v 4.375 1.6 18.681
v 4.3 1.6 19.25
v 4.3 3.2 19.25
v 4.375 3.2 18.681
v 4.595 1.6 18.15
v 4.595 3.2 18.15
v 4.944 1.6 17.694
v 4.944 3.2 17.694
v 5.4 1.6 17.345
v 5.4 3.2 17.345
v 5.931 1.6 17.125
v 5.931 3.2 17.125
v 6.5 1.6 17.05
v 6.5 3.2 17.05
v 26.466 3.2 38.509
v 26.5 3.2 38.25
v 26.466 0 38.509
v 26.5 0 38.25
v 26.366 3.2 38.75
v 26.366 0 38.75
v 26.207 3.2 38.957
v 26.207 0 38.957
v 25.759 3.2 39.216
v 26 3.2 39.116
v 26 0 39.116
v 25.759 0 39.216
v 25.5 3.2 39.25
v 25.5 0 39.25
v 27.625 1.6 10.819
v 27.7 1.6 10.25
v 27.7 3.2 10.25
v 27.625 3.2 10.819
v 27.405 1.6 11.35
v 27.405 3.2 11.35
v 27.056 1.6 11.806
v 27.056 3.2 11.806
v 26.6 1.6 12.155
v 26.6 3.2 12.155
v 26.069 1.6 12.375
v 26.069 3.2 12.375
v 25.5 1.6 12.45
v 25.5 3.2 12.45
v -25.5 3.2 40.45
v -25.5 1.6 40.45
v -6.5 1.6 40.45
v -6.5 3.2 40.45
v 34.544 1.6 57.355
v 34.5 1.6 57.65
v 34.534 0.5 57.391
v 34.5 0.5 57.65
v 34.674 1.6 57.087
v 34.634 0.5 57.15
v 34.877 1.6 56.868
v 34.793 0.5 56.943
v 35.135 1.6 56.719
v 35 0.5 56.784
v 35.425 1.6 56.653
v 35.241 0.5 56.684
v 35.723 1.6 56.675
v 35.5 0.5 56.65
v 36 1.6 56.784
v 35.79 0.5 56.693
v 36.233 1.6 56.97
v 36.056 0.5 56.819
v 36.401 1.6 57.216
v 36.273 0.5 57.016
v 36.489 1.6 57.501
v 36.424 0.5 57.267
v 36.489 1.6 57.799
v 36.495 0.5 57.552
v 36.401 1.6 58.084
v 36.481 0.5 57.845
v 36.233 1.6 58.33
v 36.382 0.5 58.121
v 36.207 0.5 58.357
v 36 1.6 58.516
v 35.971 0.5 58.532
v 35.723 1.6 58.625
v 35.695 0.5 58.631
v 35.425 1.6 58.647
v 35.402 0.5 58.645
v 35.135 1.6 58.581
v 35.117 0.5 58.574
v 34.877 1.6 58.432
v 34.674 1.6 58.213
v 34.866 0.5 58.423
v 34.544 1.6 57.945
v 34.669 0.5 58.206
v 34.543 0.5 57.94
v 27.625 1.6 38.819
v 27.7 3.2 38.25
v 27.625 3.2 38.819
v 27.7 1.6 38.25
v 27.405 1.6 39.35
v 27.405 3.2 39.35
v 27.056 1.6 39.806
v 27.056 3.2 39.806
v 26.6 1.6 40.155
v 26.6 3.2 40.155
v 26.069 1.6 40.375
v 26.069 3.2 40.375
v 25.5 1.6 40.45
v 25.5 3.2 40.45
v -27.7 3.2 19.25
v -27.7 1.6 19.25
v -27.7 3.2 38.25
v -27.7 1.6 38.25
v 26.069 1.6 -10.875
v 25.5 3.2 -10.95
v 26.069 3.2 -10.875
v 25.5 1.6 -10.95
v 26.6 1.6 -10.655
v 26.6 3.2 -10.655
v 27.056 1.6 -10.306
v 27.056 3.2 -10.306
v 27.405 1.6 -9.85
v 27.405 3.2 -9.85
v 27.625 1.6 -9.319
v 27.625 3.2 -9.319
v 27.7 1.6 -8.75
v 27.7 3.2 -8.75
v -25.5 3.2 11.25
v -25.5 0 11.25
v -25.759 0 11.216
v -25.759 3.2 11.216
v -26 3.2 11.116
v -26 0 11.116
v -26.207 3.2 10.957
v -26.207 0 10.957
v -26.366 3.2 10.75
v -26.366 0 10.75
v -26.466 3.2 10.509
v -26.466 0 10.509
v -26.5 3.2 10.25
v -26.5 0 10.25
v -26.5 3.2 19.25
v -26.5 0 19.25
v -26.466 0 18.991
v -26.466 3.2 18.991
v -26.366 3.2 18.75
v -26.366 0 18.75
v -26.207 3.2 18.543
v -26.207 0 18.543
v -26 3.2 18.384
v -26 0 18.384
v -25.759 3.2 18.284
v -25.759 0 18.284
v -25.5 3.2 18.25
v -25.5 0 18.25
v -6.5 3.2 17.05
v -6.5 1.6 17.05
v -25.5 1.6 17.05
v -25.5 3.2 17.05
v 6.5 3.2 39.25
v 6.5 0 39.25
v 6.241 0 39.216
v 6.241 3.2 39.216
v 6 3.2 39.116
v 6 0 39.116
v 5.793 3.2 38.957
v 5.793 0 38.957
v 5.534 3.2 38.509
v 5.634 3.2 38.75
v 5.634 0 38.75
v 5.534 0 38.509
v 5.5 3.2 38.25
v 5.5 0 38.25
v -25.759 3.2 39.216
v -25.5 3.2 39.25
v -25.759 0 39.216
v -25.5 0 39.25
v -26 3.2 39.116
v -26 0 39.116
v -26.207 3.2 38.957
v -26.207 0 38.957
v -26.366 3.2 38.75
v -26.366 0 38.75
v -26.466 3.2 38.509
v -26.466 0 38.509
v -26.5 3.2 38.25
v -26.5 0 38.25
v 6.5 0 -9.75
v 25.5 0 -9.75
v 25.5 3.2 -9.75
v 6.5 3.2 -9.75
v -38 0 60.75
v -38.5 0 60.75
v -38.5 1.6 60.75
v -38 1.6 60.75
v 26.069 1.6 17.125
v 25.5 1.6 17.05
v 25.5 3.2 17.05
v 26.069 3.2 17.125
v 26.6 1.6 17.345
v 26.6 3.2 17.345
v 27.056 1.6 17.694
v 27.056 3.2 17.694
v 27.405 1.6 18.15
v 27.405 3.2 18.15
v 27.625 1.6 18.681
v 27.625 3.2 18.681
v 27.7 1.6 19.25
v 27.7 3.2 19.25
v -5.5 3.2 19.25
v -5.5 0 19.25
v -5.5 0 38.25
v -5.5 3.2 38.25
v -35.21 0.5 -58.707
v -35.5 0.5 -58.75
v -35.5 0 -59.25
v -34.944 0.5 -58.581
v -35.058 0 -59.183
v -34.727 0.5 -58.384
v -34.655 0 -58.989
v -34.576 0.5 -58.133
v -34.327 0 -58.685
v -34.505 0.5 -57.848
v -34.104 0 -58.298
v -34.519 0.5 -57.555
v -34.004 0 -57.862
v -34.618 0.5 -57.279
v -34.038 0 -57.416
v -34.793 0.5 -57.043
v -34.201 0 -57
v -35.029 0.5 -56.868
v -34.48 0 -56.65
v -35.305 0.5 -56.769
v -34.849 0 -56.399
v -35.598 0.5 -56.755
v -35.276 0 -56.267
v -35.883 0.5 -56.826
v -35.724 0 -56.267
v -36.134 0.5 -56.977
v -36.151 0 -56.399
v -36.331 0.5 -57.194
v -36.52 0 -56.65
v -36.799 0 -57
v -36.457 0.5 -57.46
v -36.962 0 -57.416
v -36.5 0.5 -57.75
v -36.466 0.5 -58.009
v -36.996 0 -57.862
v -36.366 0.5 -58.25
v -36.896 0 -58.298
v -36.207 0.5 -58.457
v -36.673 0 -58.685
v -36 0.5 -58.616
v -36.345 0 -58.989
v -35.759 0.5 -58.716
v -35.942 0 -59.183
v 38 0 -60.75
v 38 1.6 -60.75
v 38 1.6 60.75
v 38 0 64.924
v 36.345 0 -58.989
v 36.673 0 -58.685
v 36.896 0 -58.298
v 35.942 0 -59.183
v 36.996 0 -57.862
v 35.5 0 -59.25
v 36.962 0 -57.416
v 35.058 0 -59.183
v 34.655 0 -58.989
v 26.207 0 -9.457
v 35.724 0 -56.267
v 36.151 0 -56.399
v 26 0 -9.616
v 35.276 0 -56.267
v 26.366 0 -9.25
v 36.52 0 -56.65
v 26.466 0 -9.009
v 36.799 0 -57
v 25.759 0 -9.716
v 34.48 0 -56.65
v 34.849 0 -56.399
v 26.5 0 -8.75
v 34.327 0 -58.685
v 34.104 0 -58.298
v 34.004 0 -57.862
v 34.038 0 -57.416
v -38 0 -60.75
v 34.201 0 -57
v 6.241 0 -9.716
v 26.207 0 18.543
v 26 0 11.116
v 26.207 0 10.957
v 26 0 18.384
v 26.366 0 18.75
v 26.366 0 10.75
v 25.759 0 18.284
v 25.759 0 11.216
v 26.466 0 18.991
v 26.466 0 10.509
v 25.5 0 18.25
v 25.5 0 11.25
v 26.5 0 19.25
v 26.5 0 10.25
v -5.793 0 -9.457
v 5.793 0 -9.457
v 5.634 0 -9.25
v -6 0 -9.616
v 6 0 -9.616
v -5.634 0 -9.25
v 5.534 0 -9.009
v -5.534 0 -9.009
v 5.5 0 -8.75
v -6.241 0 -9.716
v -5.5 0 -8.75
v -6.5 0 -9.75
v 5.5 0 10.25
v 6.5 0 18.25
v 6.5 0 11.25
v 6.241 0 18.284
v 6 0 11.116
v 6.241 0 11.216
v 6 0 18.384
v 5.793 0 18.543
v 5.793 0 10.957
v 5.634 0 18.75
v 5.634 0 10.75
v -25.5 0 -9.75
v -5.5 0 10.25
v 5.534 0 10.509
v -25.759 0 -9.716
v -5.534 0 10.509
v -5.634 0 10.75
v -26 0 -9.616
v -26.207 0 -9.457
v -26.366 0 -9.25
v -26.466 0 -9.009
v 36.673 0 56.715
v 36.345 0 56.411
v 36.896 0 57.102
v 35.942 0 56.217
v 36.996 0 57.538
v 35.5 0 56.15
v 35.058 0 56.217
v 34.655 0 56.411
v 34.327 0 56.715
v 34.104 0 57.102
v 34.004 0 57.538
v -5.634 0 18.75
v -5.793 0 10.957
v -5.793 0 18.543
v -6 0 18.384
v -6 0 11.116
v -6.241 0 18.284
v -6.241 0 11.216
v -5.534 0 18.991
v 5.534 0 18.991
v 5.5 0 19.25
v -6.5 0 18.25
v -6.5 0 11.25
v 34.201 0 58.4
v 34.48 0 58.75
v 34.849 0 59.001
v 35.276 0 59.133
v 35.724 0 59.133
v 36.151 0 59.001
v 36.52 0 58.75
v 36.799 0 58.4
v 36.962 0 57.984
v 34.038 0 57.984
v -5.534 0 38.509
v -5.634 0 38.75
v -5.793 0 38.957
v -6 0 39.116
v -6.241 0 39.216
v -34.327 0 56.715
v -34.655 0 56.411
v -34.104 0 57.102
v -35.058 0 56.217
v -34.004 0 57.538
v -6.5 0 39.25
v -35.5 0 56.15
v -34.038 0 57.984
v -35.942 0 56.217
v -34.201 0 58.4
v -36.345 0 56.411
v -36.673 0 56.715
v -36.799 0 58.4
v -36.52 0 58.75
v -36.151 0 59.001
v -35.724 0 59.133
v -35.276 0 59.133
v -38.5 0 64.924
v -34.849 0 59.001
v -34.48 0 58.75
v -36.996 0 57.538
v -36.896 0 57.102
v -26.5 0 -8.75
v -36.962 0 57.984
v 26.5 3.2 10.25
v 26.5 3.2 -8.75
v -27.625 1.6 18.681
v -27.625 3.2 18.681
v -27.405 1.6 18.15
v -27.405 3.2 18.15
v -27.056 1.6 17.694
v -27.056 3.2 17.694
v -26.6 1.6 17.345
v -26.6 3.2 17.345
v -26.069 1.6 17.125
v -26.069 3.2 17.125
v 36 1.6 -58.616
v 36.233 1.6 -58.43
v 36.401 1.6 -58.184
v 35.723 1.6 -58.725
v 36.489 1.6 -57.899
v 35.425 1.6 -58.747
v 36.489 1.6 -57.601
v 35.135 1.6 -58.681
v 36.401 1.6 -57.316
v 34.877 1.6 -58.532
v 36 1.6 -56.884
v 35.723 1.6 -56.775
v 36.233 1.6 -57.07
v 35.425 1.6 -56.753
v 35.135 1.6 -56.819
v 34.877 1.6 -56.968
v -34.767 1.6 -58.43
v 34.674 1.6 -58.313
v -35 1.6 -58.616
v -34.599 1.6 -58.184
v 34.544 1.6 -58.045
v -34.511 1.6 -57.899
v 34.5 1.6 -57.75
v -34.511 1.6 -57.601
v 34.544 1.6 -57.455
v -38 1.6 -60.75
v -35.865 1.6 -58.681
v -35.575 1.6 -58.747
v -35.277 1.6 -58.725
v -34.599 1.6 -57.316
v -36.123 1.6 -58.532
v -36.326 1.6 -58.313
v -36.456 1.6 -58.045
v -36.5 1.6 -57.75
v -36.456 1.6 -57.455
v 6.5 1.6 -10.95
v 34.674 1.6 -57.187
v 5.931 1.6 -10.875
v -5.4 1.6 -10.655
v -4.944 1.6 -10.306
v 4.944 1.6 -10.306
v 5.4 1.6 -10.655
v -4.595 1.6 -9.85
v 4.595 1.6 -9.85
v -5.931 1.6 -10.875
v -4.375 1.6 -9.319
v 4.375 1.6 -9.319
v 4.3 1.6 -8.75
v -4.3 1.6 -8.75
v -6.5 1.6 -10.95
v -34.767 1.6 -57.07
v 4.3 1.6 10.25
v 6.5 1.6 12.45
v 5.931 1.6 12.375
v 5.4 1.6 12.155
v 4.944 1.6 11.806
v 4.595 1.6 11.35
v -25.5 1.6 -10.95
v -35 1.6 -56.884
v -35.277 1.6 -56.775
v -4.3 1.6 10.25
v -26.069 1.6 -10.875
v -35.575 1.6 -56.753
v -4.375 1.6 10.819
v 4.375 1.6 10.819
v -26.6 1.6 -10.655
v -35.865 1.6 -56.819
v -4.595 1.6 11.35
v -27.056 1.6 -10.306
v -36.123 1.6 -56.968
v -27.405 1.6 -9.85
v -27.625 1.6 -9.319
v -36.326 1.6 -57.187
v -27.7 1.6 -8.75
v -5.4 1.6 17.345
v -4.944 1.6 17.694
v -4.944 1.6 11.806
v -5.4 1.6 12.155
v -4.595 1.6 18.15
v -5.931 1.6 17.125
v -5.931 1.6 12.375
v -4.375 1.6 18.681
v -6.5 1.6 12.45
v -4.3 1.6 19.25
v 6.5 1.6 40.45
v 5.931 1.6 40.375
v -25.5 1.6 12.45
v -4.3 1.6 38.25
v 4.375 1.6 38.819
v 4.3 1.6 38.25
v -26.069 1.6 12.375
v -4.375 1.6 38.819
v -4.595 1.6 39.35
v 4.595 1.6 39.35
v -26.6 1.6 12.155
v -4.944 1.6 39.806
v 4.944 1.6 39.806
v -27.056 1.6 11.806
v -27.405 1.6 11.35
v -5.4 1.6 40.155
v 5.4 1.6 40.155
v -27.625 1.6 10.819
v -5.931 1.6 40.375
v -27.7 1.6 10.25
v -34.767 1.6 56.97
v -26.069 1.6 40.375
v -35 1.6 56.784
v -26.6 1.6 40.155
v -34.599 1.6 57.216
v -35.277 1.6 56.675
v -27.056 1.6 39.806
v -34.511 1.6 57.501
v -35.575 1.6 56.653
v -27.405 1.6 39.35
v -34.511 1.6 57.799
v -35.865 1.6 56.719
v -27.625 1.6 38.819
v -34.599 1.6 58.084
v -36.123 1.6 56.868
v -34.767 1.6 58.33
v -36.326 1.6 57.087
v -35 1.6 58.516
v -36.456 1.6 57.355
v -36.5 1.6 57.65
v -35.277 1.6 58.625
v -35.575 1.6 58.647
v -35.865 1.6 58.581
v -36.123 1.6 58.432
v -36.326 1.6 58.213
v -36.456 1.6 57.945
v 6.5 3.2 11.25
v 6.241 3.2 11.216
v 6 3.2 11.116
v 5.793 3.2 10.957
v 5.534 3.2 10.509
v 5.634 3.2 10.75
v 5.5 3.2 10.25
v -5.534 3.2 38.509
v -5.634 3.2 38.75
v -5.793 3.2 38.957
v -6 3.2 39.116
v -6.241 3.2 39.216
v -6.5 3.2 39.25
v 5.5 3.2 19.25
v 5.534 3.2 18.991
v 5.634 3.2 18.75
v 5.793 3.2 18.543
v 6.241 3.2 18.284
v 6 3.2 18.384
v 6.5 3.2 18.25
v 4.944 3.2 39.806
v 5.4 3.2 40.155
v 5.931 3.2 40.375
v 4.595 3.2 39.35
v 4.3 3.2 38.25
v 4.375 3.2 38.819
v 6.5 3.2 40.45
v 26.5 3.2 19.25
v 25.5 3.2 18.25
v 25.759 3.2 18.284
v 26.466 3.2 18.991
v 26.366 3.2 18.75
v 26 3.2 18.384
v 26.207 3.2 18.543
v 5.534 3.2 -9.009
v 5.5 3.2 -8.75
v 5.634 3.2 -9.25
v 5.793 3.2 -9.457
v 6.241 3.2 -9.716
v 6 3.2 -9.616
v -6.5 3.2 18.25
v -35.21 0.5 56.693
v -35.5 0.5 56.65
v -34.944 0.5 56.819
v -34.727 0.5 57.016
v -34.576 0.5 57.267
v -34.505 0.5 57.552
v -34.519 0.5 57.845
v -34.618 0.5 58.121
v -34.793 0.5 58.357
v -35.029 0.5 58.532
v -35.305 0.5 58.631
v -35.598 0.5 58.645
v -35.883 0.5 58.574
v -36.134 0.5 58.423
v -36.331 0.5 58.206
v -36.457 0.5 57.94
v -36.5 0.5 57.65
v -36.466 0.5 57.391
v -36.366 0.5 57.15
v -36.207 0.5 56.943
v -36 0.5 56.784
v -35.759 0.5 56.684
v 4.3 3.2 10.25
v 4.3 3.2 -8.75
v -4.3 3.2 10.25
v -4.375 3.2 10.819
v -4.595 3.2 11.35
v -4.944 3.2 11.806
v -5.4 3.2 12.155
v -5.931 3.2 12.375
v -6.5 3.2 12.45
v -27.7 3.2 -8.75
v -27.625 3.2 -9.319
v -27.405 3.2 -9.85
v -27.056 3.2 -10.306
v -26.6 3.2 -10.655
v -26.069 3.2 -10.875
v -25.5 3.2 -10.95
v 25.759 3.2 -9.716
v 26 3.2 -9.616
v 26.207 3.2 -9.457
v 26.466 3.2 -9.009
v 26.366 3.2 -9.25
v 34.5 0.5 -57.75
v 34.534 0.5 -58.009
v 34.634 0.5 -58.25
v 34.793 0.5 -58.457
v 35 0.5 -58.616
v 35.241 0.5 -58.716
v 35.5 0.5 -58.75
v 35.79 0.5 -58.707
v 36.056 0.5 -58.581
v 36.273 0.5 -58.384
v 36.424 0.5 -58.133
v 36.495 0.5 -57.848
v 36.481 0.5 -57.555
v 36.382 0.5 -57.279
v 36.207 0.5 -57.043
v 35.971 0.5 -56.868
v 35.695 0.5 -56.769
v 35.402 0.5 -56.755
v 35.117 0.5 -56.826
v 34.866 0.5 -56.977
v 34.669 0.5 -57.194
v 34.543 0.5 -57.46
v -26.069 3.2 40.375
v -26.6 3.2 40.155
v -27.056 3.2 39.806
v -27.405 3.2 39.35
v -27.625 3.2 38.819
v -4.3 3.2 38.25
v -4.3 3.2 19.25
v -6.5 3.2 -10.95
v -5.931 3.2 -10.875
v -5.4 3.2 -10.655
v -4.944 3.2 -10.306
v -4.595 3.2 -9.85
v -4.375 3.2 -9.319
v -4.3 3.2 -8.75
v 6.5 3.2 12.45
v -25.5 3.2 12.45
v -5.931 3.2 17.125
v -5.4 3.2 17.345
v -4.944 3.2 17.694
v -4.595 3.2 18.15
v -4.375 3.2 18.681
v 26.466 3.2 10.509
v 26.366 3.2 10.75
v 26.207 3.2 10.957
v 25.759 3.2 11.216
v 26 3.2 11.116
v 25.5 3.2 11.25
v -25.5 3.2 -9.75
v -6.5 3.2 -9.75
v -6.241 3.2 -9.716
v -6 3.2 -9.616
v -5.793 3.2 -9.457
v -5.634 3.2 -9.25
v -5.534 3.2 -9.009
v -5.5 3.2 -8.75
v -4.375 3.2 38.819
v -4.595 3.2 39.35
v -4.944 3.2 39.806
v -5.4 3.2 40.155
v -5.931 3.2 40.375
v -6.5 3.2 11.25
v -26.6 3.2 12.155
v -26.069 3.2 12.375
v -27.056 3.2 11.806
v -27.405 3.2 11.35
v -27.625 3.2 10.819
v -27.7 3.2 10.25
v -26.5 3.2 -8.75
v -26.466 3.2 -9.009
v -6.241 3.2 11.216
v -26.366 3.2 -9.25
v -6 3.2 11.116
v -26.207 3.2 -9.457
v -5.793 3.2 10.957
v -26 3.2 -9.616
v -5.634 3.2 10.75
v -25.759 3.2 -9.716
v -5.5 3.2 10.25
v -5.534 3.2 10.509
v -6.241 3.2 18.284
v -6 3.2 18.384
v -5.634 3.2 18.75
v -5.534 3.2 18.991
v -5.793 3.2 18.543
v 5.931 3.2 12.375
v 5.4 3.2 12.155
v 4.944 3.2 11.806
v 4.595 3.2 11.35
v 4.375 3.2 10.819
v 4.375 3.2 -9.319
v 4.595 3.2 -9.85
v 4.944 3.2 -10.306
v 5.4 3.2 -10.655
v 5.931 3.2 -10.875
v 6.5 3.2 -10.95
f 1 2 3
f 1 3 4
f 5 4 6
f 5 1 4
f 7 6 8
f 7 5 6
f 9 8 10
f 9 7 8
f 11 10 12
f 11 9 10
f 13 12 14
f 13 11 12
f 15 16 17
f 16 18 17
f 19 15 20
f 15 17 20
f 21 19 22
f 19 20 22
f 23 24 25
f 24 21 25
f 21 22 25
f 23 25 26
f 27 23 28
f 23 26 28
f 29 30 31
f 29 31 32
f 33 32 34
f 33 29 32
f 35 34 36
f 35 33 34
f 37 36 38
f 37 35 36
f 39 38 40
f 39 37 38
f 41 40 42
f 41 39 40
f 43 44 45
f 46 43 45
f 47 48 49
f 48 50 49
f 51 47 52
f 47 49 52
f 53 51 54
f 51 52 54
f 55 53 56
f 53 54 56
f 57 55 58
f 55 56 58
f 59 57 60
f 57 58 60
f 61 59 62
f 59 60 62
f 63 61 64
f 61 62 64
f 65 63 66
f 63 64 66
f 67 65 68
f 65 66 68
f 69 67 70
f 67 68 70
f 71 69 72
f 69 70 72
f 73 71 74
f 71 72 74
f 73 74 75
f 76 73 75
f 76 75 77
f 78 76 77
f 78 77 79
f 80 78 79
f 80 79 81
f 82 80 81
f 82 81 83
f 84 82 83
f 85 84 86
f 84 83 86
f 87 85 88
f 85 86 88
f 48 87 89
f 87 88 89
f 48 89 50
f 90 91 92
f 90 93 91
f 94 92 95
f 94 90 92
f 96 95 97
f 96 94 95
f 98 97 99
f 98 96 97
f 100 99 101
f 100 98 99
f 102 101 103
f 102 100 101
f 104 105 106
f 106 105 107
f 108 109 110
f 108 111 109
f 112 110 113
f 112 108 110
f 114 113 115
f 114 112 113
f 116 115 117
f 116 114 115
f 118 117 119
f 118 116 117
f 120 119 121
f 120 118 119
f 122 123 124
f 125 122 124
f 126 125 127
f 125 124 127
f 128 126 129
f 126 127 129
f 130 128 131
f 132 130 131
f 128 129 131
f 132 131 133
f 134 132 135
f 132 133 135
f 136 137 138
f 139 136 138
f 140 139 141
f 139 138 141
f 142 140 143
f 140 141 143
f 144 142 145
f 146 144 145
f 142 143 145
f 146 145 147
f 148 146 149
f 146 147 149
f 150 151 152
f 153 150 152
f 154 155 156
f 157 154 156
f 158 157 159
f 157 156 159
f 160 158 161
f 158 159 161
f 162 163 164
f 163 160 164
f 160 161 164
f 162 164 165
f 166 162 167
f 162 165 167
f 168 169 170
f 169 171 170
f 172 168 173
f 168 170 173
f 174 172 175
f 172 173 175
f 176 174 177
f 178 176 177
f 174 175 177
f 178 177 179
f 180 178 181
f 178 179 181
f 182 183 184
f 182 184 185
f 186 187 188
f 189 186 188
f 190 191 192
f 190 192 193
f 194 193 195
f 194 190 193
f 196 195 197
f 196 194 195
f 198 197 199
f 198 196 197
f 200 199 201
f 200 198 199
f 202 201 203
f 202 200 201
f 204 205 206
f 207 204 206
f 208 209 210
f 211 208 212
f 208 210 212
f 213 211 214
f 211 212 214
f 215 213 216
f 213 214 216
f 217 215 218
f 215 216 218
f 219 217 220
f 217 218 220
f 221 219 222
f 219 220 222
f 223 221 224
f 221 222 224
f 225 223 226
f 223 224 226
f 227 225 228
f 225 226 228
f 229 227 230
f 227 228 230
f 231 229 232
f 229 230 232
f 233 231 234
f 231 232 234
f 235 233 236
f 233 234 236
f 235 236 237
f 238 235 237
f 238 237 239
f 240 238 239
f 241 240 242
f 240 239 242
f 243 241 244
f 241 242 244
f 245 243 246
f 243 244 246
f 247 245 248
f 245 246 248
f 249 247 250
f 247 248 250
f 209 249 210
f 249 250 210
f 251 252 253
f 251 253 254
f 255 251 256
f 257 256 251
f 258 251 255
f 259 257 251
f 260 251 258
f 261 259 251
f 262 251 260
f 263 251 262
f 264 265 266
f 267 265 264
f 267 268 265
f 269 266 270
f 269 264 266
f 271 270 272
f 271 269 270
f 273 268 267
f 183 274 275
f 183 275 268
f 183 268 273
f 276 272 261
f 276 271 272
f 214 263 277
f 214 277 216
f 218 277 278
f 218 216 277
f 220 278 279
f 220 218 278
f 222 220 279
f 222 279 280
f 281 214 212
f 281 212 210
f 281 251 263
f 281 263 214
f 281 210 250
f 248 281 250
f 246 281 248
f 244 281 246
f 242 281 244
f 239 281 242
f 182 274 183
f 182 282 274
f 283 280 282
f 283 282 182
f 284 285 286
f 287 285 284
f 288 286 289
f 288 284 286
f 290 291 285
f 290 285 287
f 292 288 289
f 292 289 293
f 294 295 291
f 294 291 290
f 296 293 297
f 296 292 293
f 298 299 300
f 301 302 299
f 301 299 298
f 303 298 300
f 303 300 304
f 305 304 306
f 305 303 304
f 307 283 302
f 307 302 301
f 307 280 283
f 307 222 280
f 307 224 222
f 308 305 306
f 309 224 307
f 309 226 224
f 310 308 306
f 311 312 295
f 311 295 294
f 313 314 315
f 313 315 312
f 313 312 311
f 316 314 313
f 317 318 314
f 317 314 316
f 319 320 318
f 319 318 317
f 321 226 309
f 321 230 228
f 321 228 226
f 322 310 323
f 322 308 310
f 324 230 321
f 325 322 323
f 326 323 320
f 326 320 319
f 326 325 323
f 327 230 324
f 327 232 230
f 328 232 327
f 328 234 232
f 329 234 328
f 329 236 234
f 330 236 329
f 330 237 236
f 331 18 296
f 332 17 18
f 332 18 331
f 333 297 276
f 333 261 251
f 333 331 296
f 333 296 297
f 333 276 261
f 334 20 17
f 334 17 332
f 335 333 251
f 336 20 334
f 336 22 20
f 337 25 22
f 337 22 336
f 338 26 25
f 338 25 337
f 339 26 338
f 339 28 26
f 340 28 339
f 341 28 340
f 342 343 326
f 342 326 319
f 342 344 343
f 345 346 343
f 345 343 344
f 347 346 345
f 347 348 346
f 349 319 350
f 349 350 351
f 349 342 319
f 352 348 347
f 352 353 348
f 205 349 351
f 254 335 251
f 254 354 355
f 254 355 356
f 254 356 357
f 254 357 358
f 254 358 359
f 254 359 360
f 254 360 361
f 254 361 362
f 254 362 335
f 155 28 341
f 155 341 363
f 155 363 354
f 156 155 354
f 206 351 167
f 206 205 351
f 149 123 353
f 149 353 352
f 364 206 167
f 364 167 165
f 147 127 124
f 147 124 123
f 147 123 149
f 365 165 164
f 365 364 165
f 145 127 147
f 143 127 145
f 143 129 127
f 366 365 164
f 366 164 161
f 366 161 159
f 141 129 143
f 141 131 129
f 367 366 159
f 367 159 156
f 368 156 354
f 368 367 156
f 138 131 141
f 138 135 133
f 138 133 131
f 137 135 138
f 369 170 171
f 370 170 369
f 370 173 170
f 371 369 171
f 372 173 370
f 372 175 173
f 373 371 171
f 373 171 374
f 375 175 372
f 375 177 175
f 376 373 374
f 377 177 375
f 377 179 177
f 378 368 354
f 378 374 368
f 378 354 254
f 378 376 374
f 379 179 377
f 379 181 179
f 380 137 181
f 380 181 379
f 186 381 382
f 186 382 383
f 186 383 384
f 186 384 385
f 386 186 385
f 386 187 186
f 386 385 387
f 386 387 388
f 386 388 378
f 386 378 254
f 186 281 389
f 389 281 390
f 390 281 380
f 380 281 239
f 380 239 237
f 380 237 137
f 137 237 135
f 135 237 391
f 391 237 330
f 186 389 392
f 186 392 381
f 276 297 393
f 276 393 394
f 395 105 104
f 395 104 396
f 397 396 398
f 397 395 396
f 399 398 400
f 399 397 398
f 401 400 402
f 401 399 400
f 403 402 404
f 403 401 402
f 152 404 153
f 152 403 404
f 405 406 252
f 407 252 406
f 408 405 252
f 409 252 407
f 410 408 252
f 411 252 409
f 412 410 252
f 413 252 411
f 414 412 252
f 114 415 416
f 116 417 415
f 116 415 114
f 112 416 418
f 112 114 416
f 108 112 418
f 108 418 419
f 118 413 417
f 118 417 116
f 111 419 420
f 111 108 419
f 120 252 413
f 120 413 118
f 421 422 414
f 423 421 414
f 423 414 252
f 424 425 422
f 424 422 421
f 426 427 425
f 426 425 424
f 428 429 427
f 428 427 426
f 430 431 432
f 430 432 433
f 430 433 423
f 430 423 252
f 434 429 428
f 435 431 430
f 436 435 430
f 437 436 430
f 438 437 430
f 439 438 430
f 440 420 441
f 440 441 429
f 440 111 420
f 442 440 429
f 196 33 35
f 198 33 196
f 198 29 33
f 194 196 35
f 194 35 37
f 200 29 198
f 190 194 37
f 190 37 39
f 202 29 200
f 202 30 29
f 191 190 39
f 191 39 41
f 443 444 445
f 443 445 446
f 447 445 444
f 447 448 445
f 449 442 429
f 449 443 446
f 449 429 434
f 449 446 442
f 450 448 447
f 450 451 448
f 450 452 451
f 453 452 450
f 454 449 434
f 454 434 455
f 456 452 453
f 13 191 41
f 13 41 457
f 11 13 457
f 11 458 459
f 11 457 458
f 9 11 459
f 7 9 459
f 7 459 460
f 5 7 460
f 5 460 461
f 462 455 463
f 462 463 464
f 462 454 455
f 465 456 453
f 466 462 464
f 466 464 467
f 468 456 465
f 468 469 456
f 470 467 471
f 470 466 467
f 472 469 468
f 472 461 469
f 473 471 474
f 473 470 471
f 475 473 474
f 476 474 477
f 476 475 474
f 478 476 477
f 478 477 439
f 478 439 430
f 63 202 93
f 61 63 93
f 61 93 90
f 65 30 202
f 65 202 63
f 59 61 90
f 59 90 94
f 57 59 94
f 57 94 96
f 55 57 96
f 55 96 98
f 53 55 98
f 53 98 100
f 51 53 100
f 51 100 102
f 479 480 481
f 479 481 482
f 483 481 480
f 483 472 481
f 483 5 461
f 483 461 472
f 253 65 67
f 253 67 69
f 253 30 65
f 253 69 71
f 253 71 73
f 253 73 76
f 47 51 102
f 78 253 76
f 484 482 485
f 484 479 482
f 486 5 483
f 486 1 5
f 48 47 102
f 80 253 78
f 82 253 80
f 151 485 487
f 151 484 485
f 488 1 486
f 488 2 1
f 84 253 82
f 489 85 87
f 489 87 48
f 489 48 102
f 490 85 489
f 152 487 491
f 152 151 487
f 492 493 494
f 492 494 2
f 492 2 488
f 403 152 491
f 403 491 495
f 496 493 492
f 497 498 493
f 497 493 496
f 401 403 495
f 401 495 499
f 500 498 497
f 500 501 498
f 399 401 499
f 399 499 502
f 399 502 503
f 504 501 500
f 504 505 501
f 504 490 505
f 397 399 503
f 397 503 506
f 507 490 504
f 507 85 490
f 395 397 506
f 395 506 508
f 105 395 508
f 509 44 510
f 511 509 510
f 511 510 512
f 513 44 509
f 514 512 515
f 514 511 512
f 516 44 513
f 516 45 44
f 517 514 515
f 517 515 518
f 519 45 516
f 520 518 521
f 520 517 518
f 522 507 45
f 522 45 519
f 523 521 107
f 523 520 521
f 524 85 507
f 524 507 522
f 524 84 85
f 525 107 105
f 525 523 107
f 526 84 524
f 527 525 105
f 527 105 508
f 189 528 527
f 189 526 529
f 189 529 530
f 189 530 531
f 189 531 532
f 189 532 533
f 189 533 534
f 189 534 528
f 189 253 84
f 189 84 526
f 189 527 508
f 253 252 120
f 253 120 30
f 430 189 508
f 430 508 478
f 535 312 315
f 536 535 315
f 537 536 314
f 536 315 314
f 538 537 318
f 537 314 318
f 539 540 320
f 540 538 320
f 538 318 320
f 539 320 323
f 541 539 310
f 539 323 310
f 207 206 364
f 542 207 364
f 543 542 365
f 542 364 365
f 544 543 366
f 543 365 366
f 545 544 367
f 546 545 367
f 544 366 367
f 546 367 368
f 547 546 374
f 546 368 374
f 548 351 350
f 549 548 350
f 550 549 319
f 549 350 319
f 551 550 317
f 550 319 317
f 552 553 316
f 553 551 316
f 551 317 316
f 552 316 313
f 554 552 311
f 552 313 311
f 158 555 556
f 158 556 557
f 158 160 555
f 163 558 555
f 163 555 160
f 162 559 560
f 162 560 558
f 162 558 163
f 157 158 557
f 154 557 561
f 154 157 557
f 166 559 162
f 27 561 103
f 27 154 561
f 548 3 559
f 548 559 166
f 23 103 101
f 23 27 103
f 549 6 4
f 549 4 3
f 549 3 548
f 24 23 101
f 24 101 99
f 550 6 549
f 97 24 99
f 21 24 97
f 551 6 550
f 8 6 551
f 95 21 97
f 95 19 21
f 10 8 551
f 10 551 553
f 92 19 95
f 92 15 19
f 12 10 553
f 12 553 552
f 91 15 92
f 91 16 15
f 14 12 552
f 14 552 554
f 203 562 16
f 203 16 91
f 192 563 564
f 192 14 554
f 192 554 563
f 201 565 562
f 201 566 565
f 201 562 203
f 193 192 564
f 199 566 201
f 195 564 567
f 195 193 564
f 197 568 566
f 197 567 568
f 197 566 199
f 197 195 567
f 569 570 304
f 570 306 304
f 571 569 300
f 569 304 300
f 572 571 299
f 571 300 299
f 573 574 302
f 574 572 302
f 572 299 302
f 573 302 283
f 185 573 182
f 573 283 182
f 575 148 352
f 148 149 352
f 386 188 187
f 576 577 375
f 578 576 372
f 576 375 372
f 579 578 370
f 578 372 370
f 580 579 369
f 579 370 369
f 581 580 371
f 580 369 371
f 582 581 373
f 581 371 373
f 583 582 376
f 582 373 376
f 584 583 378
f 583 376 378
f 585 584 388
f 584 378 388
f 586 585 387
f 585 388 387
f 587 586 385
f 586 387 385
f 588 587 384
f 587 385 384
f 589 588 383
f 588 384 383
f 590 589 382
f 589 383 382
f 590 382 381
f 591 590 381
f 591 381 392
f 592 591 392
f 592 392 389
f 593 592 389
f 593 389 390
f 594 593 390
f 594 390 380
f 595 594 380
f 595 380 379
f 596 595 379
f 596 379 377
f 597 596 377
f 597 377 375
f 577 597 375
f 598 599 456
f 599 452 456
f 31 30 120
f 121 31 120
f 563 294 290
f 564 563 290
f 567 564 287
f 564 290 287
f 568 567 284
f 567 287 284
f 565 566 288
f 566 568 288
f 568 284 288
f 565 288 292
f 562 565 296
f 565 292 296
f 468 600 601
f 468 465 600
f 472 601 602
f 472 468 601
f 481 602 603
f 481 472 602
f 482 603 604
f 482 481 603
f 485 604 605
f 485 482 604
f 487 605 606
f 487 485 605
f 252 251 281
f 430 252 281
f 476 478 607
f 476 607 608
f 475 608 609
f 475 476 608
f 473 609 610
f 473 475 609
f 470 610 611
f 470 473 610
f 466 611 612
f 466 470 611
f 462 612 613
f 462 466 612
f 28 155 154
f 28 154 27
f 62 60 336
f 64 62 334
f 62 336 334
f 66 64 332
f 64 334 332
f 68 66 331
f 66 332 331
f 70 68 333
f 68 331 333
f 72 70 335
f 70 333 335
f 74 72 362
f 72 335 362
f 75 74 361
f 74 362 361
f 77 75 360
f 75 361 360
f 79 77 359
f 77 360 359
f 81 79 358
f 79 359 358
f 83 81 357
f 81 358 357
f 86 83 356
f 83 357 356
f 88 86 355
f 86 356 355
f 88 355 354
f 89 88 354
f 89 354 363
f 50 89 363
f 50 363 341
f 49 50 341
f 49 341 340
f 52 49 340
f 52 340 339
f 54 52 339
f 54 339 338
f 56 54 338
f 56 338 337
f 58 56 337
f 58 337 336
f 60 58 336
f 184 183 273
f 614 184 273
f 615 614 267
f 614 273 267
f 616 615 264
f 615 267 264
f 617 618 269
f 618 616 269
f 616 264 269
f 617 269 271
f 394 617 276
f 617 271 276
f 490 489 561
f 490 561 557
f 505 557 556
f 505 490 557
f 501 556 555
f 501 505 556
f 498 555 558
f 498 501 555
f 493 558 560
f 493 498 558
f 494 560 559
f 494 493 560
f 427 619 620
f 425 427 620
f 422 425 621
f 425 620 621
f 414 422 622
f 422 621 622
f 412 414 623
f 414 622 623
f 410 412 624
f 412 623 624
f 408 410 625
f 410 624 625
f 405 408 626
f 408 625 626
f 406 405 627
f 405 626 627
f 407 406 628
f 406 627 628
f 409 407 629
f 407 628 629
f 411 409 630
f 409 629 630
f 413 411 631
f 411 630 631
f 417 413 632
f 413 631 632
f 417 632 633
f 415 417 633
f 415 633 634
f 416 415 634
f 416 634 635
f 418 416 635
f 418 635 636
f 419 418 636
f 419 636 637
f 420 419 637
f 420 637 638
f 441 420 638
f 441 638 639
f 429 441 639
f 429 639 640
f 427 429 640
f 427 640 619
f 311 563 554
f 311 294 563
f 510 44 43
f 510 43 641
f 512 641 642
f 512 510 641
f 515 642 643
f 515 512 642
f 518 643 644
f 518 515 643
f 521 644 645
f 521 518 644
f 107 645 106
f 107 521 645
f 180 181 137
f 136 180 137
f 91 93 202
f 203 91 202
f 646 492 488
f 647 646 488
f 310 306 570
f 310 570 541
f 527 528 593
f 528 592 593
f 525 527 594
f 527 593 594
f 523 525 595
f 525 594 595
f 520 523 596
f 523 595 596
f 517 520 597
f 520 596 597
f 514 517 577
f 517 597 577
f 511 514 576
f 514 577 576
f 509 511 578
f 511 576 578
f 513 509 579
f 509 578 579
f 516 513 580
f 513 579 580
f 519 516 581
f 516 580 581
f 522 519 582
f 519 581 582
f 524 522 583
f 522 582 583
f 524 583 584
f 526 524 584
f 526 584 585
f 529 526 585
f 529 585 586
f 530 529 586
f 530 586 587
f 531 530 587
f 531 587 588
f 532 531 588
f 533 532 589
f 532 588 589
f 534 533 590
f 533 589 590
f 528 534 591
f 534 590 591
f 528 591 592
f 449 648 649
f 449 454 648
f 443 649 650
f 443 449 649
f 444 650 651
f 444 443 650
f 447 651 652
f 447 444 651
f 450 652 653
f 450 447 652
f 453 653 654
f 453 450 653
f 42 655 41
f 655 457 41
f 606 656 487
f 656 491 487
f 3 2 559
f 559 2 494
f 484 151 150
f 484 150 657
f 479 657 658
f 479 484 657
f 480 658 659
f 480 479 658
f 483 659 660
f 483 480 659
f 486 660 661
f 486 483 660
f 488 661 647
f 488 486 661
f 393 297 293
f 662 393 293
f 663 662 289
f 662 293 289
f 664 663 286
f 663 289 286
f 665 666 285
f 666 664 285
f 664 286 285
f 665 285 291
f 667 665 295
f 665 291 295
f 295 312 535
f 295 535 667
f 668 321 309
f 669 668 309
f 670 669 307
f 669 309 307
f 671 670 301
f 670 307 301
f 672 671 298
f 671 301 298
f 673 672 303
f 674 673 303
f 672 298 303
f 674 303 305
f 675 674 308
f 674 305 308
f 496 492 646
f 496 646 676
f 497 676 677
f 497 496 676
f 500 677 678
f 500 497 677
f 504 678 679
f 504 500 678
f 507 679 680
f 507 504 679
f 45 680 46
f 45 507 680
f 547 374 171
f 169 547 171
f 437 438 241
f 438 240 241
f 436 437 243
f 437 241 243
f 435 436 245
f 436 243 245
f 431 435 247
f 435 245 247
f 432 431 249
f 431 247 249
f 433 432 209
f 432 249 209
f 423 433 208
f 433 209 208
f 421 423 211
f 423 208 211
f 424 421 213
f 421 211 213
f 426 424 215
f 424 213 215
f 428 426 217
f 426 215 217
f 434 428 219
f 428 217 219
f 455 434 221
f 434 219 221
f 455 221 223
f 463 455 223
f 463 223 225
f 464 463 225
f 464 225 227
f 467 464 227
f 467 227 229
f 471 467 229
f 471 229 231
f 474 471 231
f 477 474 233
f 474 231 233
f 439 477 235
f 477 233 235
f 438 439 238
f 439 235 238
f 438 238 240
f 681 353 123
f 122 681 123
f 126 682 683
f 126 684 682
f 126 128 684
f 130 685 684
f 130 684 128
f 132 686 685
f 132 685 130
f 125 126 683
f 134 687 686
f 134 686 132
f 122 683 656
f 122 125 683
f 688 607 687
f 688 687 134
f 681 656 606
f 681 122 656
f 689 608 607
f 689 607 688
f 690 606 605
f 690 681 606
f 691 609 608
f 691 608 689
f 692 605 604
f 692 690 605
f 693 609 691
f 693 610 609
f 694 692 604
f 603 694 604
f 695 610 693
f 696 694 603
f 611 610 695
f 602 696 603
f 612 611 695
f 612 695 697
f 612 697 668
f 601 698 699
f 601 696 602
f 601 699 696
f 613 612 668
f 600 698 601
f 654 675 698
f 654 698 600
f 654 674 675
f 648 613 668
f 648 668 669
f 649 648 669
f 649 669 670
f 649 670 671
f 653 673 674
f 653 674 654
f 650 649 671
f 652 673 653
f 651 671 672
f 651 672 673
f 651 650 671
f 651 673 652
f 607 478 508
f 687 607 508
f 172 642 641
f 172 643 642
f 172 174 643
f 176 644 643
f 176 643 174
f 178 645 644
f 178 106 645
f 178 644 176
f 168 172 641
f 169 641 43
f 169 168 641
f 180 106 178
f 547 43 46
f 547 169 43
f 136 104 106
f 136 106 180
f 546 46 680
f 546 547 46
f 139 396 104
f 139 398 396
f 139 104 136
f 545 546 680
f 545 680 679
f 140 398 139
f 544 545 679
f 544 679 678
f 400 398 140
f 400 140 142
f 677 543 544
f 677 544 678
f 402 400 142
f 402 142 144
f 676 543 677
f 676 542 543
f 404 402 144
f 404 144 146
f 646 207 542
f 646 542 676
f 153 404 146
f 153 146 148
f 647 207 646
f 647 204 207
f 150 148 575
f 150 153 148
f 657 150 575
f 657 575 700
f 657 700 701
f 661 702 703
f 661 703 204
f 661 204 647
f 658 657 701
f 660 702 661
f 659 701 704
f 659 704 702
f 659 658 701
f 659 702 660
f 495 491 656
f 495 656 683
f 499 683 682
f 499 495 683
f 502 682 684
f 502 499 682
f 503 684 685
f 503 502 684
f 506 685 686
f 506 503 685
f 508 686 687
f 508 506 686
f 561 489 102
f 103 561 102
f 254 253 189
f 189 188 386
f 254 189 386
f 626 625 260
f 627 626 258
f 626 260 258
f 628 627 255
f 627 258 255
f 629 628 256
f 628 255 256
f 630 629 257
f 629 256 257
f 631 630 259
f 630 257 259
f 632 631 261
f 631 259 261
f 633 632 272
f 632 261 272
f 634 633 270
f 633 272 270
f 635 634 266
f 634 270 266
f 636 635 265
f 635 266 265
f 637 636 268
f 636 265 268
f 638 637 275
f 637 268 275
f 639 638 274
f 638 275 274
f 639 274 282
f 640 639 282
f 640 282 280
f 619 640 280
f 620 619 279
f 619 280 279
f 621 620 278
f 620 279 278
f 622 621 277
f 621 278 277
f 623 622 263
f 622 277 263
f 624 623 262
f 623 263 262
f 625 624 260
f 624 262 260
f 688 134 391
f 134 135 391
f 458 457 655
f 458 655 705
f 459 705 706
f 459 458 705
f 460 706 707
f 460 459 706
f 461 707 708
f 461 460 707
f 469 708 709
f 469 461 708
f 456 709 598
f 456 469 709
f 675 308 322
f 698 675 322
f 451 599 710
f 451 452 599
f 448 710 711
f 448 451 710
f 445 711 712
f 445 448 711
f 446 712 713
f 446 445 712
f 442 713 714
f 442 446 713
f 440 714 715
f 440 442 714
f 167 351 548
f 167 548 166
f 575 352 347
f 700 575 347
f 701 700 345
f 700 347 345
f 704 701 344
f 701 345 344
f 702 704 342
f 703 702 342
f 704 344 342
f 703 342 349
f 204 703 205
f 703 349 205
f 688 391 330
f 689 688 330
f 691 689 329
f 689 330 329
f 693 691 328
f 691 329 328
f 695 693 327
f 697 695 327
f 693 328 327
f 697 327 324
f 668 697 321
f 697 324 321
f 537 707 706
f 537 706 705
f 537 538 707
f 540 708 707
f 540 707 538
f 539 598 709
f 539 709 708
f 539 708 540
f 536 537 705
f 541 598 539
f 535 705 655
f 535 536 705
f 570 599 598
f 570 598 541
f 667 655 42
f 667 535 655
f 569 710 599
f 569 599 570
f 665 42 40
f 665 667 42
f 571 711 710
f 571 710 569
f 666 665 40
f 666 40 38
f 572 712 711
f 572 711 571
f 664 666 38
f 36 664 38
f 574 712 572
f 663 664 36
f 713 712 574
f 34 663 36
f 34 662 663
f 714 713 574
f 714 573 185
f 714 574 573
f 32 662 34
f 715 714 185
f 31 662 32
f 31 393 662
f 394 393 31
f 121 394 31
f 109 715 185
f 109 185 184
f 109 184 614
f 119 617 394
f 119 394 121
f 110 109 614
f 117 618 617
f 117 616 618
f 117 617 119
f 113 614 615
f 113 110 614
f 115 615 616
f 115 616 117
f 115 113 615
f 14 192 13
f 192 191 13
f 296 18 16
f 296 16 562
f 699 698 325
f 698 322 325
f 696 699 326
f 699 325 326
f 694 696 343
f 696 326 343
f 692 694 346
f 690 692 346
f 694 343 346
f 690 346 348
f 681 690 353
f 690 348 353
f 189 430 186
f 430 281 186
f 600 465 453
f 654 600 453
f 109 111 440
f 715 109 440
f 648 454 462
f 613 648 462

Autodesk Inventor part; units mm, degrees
ref_plane "YZ Plane" through (0, 0, 0) normal (1, 0, 0) x (0, 1, 0)
sketch "Sketch1" plane through (0, 0, 0) normal (0, 1, 0) x (-1, 0, 0)
  line L0 (38, 60.75) -> (-38, 60.75)
  line L1 (-38, 60.75) -> (-38, -60.75)
  line L2 (-38, -60.75) -> (38, -60.75)
  line L3 (38, -60.75) -> (38, 60.75)
  line L4 (0, 60.75) -> (0, -60.75) construction
  line L5 (-6.5, 39.25) -> (-25.5, 39.25)
  line L6 (-26.5, 38.25) -> (-26.5, 19.25)
  line L7 (-25.5, 18.25) -> (-6.5, 18.25)
  line L8 (-5.5, 19.25) -> (-5.5, 38.25)
  arc A0 (-5.5, 38.25) -> (-6.5, 39.25) centre (-6.5, 38.25) ccw
  arc A1 (-6.5, 18.25) -> (-5.5, 19.25) centre (-6.5, 19.25) ccw
  arc A2 (-26.5, 19.25) -> (-25.5, 18.25) centre (-25.5, 19.25) ccw
  arc A3 (-25.5, 39.25) -> (-26.5, 38.25) centre (-25.5, 38.25) ccw
  circle A4 centre (35.5, 57.65) radius 1
  circle A5 centre (-35.5, 57.65) radius 1
  line L9 (0, 0) -> (-51.842, 0) construction
  circle A6 centre (35.5, -57.75) radius 1
  circle A7 centre (-35.5, -57.75) radius 1
  line L10 (6.5, 39.25) -> (25.5, 39.25)
  line L11 (26.5, 38.25) -> (26.5, 19.25)
  line L12 (25.5, 18.25) -> (6.5, 18.25)
  line L13 (5.5, 19.25) -> (5.5, 38.25)
  arc A8 (6.5, 39.25) -> (5.5, 38.25) centre (6.5, 38.25) ccw
  arc A9 (5.5, 19.25) -> (6.5, 18.25) centre (6.5, 19.25) ccw
  arc A10 (25.5, 18.25) -> (26.5, 19.25) centre (25.5, 19.25) ccw
  arc A11 (26.5, 38.25) -> (25.5, 39.25) centre (25.5, 38.25) ccw
  line L14 (25.5, -9.75) -> (6.5, -9.75)
  arc A12 (25.5, -9.75) -> (26.5, -8.75) centre (25.5, -8.75) ccw
  arc A13 (5.5, -8.75) -> (6.5, -9.75) centre (6.5, -8.75) ccw
  arc A14 (-6.5, -9.75) -> (-5.5, -8.75) centre (-6.5, -8.75) ccw
  line L15 (-25.5, -9.75) -> (-6.5, -9.75)
  arc A15 (-26.5, -8.75) -> (-25.5, -9.75) centre (-25.5, -8.75) ccw
  line L16 (-6.5, 11.25) -> (-25.5, 11.25)
  line L17 (-26.5, 10.25) -> (-26.5, -8.75)
  line L18 (-5.5, -8.75) -> (-5.5, 10.25)
  arc A16 (-5.5, 10.25) -> (-6.5, 11.25) centre (-6.5, 10.25) ccw
  arc A17 (-25.5, 11.25) -> (-26.5, 10.25) centre (-25.5, 10.25) ccw
  line L19 (5.5, -8.75) -> (5.5, 10.25)
  line L20 (26.5, 10.25) -> (26.5, -8.75)
  arc A18 (6.5, 11.25) -> (5.5, 10.25) centre (6.5, 10.25) ccw
  line L21 (6.5, 11.25) -> (25.5, 11.25)
  arc A19 (26.5, 10.25) -> (25.5, 11.25) centre (25.5, 10.25) ccw
  point P0 (-26.5, 18.25)
  point P1 (-26.5, 39.25)
  point P2 (-5.5, 18.25)
  point P3 (26.5, 18.25)
  point P4 (26.5, 39.25)
  point P5 (5.5, 18.25)
  point P6 (26.5, -9.75)
  point P7 (5.5, -9.75)
  point P8 (-5.5, -9.75)
  point P9 (-26.5, -9.75)
  point P10 (-26.5, 11.25)
  point P11 (26.5, 11.25)
  dimension "d0" = 121.5
  dimension "d1" = 76
  dimension "d2" = 21
  dimension "d3" = 21
  dimension "d5" = 1
  dimension "d15" = 2
  dimension "d30" = 3.1
  dimension "d31" = 2.5
  dimension "d33" = 3
  dimension "d52" = 5.5
  dimension "d55" = 28
  dimension "d60" = 100
  dimension "d73" = 2.5
  dimension "d74" = 2.5
  dimension "d75" = 2.5
extrude "Extrusion6" add sketch "Sketch1" along normal blind 1.6
hole "Hole3" at (-35.5, 0, 57.65) at (35.5, 0, 57.65) at (-35.5, 0, -57.75) at (35.5, 0, -57.75) direction (0, 1, 0) diameter 2 depth 8 tip angle 118 countersink diameter 3 countersink angle 90
ref_plane "Work Plane1" through (-38.5, 0, -61) normal (-1, 0, 0) x (0, 0, 1)
sketch "Sketch2" plane through (-38.5, 0, -61) normal (-1, 0, 0) x (0, 0, 1)
  line L0 (0, 0) -> (121.75, 0) projected
  line L1 (121.75, 0) -> (121.75, 1.6) projected
  line L2 (121.75, 1.6) -> (125.924, 0)
  line L3 (121.75, 0) -> (125.924, 0)
  point P0 (61, 0)
  point P1 (121.924, 0)
ref_plane "Work Plane2" through (0, 1.5, 0) normal (0, 1, 0) x (1, 0, 0)
extrude "Extrusion8" add sketch "Sketch2" against normal up to surface (76.5 mm away)
sketch "Sketch4" plane through (0, 1.6, 0) normal (0, 1, 0) x (1, 0, 0)
  arc A0 (6.5, 9.75) -> (5.5, 8.75) centre (6.5, 8.75) ccw projected
  line L0 (6.5, 9.75) -> (25.5, 9.75) projected
  arc A1 (26.5, 8.75) -> (25.5, 9.75) centre (25.5, 8.75) ccw projected
  line L1 (26.5, 8.75) -> (26.5, -10.25) projected
  arc A2 (25.5, -11.25) -> (26.5, -10.25) centre (25.5, -10.25) ccw projected
  line L2 (25.5, -11.25) -> (6.5, -11.25) projected
  arc A3 (5.5, -10.25) -> (6.5, -11.25) centre (6.5, -10.25) ccw projected
  line L3 (5.5, -10.25) -> (5.5, 8.75) projected
  arc A4 (-5.5, 8.75) -> (-6.5, 9.75) centre (-6.5, 8.75) ccw projected
  line L4 (-5.5, 8.75) -> (-5.5, -10.25) projected
  arc A5 (-6.5, -11.25) -> (-5.5, -10.25) centre (-6.5, -10.25) ccw projected
  line L5 (-6.5, -11.25) -> (-25.5, -11.25) projected
  arc A6 (-26.5, -10.25) -> (-25.5, -11.25) centre (-25.5, -10.25) ccw projected
  line L6 (-26.5, -10.25) -> (-26.5, 8.75) projected
  arc A7 (-25.5, 9.75) -> (-26.5, 8.75) centre (-25.5, 8.75) ccw projected
  line L7 (-25.5, 9.75) -> (-6.5, 9.75) projected
  arc A8 (-5.5, -19.25) -> (-6.5, -18.25) centre (-6.5, -19.25) ccw projected
  line L8 (-5.5, -19.25) -> (-5.5, -38.25) projected
  arc A9 (-6.5, -39.25) -> (-5.5, -38.25) centre (-6.5, -38.25) ccw projected
  line L9 (-6.5, -39.25) -> (-25.5, -39.25) projected
  arc A10 (-26.5, -38.25) -> (-25.5, -39.25) centre (-25.5, -38.25) ccw projected
  line L10 (-26.5, -38.25) -> (-26.5, -19.25) projected
  arc A11 (-25.5, -18.25) -> (-26.5, -19.25) centre (-25.5, -19.25) ccw projected
  line L11 (-25.5, -18.25) -> (-6.5, -18.25) projected
  arc A12 (6.5, -18.25) -> (5.5, -19.25) centre (6.5, -19.25) ccw projected
  line L12 (6.5, -18.25) -> (25.5, -18.25) projected
  arc A13 (26.5, -19.25) -> (25.5, -18.25) centre (25.5, -19.25) ccw projected
  line L13 (26.5, -19.25) -> (26.5, -38.25) projected
  arc A14 (25.5, -39.25) -> (26.5, -38.25) centre (25.5, -38.25) ccw projected
  line L14 (25.5, -39.25) -> (6.5, -39.25) projected
  arc A15 (5.5, -38.25) -> (6.5, -39.25) centre (6.5, -38.25) ccw projected
  line L15 (5.5, -38.25) -> (5.5, -19.25) projected
  circle A16 centre (35.5, 57.75) radius 1 projected
  circle A17 centre (-35.5, 57.75) radius 1 projected
  circle A18 centre (35.5, -57.65) radius 1 projected
  circle A19 centre (-35.5, -57.65) radius 1 projected
  line L16 (-38, -60.75) -> (38, -60.75) projected
  line L17 (38, -60.75) -> (38, 60.75) projected
  line L18 (38, 60.75) -> (-38, 60.75) projected
  line L19 (-38, 60.75) -> (-38, -60.75) projected
  line L20 (6.5, -40.45) -> (25.5, -40.45)
  arc A20 (25.5, -40.45) -> (27.7, -38.25) centre (25.5, -38.25) ccw
  line L21 (27.7, -38.25) -> (27.7, -19.25)
  arc A21 (27.7, -19.25) -> (25.5, -17.05) centre (25.5, -19.25) ccw
  line L22 (25.5, -17.05) -> (6.5, -17.05)
  arc A22 (6.5, -17.05) -> (4.3, -19.25) centre (6.5, -19.25) ccw
  line L23 (4.3, -19.25) -> (4.3, -38.25)
  arc A23 (4.3, -38.25) -> (6.5, -40.45) centre (6.5, -38.25) ccw
  line L24 (6.5, -12.45) -> (25.5, -12.45)
  arc A24 (25.5, -12.45) -> (27.7, -10.25) centre (25.5, -10.25) ccw
  line L25 (27.7, -10.25) -> (27.7, 8.75)
  arc A25 (27.7, 8.75) -> (25.5, 10.95) centre (25.5, 8.75) ccw
  line L26 (25.5, 10.95) -> (6.5, 10.95)
  arc A26 (6.5, 10.95) -> (4.3, 8.75) centre (6.5, 8.75) ccw
  line L27 (4.3, 8.75) -> (4.3, -10.25)
  arc A27 (4.3, -10.25) -> (6.5, -12.45) centre (6.5, -10.25) ccw
  point P0 (0, 0)
  dimension "d69" = 1.2
  dimension "d70" = 1.2
extrude "Extrusion9" add sketch "Sketch4" along normal blind 1.6 contours A23 L23 A22 L22 A21 L21 A20 L20 | A27 L27 A26 L26 A25 L25 A24 L24
mirror "Mirror1" about plane through (0, 0, 0) normal (1, 0, 0) of "Extrusion9"
equation "\"d2\" = d3"
equation "\"d3\" = 1.05 * button_side"
equation "\"d73\" = d31"
equation "\"button_side\" = 20"
properties part number "front_cover" material "Aluminum 6061"
